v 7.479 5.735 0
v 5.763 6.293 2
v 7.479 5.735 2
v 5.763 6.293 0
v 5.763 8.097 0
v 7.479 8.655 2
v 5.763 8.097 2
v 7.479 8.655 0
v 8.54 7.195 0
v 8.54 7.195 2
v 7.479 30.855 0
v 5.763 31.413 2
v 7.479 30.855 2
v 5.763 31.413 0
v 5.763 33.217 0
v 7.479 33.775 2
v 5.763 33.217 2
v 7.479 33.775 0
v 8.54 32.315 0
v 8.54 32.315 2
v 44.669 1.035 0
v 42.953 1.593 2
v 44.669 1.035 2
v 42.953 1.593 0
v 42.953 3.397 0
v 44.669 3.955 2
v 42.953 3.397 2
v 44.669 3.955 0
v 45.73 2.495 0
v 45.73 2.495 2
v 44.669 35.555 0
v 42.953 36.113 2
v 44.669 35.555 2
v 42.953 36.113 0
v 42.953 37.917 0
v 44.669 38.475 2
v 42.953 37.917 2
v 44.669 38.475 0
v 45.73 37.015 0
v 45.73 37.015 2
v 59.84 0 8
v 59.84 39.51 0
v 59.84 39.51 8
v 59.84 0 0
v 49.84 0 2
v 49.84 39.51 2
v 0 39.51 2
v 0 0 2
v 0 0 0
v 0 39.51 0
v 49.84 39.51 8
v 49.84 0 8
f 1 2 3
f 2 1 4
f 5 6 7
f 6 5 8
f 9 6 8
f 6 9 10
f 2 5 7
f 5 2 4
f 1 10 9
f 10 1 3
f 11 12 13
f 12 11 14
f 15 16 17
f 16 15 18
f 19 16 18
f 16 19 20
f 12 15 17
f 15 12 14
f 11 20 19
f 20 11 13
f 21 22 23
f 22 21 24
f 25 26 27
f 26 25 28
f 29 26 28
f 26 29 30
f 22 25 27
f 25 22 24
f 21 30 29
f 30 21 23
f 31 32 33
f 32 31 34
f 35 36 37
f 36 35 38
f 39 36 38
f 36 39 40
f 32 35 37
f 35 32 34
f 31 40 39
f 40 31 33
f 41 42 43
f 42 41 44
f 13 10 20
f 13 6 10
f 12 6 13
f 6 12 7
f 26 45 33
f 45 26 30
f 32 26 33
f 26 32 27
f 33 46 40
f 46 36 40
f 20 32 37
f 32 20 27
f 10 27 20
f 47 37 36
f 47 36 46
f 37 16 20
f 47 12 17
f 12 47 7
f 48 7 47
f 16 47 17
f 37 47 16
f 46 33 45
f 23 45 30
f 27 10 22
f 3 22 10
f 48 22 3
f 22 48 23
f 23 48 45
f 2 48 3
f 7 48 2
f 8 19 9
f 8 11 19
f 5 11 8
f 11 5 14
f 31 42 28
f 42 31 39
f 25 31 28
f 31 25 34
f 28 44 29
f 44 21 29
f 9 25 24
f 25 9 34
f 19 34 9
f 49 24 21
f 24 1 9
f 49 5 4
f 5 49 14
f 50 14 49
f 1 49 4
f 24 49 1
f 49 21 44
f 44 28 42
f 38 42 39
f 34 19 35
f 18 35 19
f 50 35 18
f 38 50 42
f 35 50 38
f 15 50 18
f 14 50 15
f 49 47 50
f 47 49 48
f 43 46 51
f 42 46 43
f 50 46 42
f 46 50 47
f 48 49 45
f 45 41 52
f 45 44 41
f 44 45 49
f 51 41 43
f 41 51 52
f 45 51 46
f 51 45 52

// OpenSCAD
PCB=[59.84,39.51,2]; //

D=3.07;
HOLES=[ 
        for (i = [[ 5.47,5.66 ], [42.66 ,0.96]])  i+[D,D]/2
    ] ;

module atHoles() {
    for(p=HOLES) {
        
        translate([p[0],p[1],0])
            children();
        translate([p[0],PCB[1]-p[1],0])
            children();
        
    }
    
    
}

module pcb() {
    color([0,1,0]) {
    translate([PCB[0]-10,0,0])
    cube([10,PCB[1],8]);
    difference() {
        cube(PCB);
        atHoles() {
            cylinder(d=D,center=true,h=10);
        }
    }
}
    
}

    pcb();
        
difference() {
    
    
}
        
